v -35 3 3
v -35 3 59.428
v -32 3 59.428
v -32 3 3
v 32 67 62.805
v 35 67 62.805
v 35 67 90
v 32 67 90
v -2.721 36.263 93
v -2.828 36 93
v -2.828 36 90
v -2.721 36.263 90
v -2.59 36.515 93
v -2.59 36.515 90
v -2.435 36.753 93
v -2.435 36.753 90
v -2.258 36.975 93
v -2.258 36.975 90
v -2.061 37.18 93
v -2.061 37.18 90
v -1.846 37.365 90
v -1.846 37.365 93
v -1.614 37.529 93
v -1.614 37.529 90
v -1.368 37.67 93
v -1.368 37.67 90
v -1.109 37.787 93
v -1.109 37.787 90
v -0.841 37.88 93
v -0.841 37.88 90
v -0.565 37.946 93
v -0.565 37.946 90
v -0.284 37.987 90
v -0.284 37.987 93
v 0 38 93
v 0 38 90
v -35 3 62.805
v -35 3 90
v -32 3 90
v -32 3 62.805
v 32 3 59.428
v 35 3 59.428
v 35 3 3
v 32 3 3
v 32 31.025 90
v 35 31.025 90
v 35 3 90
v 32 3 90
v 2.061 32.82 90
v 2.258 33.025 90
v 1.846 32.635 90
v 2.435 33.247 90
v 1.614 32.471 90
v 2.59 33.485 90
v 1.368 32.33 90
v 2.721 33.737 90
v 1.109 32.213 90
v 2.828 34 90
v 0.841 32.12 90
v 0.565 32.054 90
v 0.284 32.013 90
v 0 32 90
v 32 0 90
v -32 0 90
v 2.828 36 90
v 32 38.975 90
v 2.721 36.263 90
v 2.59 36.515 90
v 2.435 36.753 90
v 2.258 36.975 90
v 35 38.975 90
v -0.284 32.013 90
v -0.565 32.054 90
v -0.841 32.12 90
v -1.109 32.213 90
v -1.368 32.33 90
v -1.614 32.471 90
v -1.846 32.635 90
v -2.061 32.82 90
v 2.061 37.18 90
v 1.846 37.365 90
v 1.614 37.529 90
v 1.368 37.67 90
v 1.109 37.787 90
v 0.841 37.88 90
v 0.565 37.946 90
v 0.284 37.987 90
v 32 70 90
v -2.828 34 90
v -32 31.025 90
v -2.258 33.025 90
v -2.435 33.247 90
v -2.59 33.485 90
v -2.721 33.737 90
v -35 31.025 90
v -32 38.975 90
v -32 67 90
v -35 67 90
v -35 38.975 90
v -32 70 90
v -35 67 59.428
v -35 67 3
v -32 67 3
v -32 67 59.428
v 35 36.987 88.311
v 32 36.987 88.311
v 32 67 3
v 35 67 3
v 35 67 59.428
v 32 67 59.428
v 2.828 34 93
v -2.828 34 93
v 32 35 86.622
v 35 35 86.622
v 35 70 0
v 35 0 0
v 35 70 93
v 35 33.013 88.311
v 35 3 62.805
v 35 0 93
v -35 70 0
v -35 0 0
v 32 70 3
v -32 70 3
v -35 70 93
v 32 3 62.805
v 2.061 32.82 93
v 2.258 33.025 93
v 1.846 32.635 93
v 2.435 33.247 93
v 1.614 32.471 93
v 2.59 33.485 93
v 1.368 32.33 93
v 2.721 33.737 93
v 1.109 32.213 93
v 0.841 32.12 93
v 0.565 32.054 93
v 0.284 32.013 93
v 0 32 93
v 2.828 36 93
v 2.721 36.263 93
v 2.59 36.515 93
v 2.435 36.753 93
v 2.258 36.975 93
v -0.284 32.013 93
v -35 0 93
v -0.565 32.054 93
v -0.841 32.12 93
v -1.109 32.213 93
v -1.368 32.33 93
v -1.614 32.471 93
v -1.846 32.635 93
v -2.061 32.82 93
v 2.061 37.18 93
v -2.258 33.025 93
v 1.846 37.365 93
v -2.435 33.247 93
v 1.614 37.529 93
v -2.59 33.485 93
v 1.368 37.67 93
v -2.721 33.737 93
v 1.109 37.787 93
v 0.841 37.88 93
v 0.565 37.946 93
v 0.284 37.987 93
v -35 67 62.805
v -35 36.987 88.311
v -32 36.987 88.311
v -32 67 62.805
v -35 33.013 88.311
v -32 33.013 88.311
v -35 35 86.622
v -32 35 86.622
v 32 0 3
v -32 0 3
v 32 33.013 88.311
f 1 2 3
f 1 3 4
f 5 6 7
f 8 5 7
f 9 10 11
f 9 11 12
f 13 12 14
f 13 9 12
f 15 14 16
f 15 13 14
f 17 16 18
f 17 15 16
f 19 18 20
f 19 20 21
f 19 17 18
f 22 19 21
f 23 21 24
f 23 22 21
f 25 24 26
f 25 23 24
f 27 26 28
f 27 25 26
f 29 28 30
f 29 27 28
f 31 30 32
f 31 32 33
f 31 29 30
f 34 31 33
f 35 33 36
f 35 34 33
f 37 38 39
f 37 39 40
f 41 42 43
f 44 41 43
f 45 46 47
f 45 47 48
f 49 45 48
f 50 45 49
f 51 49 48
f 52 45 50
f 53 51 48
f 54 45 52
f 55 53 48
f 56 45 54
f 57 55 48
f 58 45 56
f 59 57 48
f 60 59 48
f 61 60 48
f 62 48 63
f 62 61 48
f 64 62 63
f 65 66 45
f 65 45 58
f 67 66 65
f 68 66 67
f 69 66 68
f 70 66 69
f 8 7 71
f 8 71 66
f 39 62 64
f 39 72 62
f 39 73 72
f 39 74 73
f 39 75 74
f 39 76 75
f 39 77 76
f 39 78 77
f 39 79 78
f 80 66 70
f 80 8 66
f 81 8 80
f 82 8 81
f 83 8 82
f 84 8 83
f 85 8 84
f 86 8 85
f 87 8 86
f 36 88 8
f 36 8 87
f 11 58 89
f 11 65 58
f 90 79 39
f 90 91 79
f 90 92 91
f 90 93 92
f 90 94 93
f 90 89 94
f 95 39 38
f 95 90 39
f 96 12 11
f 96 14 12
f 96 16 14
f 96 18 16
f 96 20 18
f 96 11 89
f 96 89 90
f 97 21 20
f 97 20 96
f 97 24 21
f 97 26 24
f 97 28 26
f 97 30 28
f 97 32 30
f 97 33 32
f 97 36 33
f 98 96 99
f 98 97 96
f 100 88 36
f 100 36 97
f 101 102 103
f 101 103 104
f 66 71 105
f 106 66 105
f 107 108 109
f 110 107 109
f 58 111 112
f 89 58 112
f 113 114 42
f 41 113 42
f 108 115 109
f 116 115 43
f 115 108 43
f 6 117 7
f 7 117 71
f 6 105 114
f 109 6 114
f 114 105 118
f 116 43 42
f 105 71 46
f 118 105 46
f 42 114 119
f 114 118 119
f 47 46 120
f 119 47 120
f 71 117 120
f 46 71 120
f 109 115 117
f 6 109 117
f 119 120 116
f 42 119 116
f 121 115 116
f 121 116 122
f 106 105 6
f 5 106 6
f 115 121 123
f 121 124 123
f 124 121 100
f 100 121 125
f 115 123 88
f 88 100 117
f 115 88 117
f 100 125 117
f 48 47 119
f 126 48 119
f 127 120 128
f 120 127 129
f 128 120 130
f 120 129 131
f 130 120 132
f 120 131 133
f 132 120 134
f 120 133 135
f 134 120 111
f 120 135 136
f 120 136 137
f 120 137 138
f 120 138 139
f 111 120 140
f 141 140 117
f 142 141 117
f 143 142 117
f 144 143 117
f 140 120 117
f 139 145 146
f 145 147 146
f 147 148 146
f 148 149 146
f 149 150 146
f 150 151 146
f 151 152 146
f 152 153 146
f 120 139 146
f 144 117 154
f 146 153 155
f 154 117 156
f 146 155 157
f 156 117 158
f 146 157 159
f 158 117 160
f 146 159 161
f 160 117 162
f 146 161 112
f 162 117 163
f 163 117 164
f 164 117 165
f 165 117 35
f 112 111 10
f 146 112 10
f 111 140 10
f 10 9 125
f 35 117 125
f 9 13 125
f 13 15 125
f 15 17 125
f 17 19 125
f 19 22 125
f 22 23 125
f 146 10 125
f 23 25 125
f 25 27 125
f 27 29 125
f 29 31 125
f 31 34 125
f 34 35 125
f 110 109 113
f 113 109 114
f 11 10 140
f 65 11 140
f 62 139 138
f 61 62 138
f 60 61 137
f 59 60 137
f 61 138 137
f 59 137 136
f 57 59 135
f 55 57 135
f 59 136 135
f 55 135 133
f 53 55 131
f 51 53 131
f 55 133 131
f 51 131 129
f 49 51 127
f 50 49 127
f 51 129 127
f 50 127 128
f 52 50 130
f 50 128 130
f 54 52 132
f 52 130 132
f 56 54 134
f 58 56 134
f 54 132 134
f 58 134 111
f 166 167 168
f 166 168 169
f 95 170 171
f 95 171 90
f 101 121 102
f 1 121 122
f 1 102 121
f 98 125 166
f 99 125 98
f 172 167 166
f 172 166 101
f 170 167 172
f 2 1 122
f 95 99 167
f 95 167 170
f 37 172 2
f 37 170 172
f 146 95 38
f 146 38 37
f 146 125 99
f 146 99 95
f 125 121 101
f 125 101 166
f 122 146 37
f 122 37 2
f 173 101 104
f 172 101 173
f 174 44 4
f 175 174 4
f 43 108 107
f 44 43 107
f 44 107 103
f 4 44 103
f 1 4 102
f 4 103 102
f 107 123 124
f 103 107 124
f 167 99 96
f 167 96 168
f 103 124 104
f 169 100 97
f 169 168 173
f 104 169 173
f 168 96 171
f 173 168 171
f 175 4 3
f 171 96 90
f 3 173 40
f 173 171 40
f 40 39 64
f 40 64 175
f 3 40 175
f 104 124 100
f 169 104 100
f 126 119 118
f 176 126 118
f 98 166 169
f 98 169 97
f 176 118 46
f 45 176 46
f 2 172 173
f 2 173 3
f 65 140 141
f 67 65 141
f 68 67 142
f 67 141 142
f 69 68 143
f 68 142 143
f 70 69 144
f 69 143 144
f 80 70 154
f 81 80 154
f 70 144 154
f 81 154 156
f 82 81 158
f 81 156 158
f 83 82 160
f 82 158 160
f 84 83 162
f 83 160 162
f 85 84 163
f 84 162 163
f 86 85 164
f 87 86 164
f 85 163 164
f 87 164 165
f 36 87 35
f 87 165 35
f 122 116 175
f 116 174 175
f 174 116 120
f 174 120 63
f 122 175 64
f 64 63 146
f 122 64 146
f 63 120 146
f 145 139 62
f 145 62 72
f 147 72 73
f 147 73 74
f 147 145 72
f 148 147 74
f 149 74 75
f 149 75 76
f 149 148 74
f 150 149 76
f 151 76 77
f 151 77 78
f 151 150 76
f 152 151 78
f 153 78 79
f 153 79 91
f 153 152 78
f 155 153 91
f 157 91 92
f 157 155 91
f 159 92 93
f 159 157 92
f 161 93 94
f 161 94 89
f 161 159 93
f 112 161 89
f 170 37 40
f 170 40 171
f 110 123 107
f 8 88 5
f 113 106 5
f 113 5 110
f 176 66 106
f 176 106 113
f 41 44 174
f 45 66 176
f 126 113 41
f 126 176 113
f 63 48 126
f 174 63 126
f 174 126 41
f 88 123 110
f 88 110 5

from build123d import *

# Parameters (mm, degrees)
F0_W     = 35
F0_H     = 70
F1_DEPTH = 3
F3_DEPTH = 3
F5_DEPTH = 3


# Not quite as in the source:
# - a feature names something its author has since deleted; it is built from what else it names


with BuildPart() as f1:
    # F0 (on Top) → F1 (new body)
    with BuildSketch(Plane.XY):
        with Locations((-17.5, 35)):
            Rectangle(F0_W, F0_H)
    extrude(amount=F1_DEPTH)

    # F2 (on face) → F3 (join)
    with BuildSketch(Plane(origin=(-35, 0, 0), x_dir=(0, -1, 0), z_dir=(-1, 0, 0))):
        Polygon((-35, 86.622338891), (-3, 59.4277828932), (-3, 62.8054440022), (-33.0127427803, 88.3111694455), align=None)
        Polygon((-67, 62.8054440022), (-67, 59.4277828932), (-35, 86.622338891), (-36.9872572197, 88.3111694455), align=None)
        Polygon((-70, 93), (-70, 90), (-67, 90), (-38.9745144394, 90), (-35, 90), (-35, 93), align=None)
        Polygon((0, 93), (-35, 93), (-35, 90), (-31.0254855606, 90), (-3, 90), (0, 90), align=None)
        Polygon((-35, 90), (-33.0127427803, 88.3111694455), (-31.0254855606, 90), align=None)
        Polygon((-36.9872572197, 88.3111694455), (-35, 86.622338891), (-33.0127427803, 88.3111694455), (-35, 90), align=None)
        Polygon((-35, 90), (-38.9745144394, 90), (-36.9872572197, 88.3111694455), align=None)
        Polygon((-70, 90), (-70, 3), (-67, 3), (-67, 59.4277828932), (-67, 62.8054440022), (-67, 90), align=None)
        Polygon((-3, 59.4277828932), (-3, 3), (0, 3), (0, 90), (-3, 90), (-3, 62.8054440022), align=None)
    extrude(amount=-F3_DEPTH)

    # F4 (on face) → F5 (join)
    with BuildSketch(Plane.XY.offset(93)):
        with BuildLine():
            Line((-32, 70), (-32, 0))
            Line((-32, 0), (0, 0))
            Line((0, 0), (0, 32))
            ThreePointArc((0, 32), (-1.7320508076, 32.5505102572), (-2.8284271247, 34))
            ThreePointArc((-2.8284271247, 34), (-3, 35), (-2.8284271247, 36))
            ThreePointArc((-2.8284271247, 36), (-1.7320508076, 37.4494897428), (0, 38))
            Line((0, 38), (0, 70))
            Line((0, 70), (-32, 70))
        make_face()
        with BuildLine():
            Line((-2.8284271247, 34), (0, 34))
            Line((0, 34), (0, 36))
            Line((0, 36), (-2.8284271247, 36))
            ThreePointArc((-2.8284271247, 36), (-3, 35), (-2.8284271247, 34))
        make_face()
    extrude(amount=-F5_DEPTH)

    # F6: F1 across plane


with BuildPart() as f1_1:
    add(f1.part)
    add(f1.part.mirror(Plane.YZ))


solid = f1_1.part
